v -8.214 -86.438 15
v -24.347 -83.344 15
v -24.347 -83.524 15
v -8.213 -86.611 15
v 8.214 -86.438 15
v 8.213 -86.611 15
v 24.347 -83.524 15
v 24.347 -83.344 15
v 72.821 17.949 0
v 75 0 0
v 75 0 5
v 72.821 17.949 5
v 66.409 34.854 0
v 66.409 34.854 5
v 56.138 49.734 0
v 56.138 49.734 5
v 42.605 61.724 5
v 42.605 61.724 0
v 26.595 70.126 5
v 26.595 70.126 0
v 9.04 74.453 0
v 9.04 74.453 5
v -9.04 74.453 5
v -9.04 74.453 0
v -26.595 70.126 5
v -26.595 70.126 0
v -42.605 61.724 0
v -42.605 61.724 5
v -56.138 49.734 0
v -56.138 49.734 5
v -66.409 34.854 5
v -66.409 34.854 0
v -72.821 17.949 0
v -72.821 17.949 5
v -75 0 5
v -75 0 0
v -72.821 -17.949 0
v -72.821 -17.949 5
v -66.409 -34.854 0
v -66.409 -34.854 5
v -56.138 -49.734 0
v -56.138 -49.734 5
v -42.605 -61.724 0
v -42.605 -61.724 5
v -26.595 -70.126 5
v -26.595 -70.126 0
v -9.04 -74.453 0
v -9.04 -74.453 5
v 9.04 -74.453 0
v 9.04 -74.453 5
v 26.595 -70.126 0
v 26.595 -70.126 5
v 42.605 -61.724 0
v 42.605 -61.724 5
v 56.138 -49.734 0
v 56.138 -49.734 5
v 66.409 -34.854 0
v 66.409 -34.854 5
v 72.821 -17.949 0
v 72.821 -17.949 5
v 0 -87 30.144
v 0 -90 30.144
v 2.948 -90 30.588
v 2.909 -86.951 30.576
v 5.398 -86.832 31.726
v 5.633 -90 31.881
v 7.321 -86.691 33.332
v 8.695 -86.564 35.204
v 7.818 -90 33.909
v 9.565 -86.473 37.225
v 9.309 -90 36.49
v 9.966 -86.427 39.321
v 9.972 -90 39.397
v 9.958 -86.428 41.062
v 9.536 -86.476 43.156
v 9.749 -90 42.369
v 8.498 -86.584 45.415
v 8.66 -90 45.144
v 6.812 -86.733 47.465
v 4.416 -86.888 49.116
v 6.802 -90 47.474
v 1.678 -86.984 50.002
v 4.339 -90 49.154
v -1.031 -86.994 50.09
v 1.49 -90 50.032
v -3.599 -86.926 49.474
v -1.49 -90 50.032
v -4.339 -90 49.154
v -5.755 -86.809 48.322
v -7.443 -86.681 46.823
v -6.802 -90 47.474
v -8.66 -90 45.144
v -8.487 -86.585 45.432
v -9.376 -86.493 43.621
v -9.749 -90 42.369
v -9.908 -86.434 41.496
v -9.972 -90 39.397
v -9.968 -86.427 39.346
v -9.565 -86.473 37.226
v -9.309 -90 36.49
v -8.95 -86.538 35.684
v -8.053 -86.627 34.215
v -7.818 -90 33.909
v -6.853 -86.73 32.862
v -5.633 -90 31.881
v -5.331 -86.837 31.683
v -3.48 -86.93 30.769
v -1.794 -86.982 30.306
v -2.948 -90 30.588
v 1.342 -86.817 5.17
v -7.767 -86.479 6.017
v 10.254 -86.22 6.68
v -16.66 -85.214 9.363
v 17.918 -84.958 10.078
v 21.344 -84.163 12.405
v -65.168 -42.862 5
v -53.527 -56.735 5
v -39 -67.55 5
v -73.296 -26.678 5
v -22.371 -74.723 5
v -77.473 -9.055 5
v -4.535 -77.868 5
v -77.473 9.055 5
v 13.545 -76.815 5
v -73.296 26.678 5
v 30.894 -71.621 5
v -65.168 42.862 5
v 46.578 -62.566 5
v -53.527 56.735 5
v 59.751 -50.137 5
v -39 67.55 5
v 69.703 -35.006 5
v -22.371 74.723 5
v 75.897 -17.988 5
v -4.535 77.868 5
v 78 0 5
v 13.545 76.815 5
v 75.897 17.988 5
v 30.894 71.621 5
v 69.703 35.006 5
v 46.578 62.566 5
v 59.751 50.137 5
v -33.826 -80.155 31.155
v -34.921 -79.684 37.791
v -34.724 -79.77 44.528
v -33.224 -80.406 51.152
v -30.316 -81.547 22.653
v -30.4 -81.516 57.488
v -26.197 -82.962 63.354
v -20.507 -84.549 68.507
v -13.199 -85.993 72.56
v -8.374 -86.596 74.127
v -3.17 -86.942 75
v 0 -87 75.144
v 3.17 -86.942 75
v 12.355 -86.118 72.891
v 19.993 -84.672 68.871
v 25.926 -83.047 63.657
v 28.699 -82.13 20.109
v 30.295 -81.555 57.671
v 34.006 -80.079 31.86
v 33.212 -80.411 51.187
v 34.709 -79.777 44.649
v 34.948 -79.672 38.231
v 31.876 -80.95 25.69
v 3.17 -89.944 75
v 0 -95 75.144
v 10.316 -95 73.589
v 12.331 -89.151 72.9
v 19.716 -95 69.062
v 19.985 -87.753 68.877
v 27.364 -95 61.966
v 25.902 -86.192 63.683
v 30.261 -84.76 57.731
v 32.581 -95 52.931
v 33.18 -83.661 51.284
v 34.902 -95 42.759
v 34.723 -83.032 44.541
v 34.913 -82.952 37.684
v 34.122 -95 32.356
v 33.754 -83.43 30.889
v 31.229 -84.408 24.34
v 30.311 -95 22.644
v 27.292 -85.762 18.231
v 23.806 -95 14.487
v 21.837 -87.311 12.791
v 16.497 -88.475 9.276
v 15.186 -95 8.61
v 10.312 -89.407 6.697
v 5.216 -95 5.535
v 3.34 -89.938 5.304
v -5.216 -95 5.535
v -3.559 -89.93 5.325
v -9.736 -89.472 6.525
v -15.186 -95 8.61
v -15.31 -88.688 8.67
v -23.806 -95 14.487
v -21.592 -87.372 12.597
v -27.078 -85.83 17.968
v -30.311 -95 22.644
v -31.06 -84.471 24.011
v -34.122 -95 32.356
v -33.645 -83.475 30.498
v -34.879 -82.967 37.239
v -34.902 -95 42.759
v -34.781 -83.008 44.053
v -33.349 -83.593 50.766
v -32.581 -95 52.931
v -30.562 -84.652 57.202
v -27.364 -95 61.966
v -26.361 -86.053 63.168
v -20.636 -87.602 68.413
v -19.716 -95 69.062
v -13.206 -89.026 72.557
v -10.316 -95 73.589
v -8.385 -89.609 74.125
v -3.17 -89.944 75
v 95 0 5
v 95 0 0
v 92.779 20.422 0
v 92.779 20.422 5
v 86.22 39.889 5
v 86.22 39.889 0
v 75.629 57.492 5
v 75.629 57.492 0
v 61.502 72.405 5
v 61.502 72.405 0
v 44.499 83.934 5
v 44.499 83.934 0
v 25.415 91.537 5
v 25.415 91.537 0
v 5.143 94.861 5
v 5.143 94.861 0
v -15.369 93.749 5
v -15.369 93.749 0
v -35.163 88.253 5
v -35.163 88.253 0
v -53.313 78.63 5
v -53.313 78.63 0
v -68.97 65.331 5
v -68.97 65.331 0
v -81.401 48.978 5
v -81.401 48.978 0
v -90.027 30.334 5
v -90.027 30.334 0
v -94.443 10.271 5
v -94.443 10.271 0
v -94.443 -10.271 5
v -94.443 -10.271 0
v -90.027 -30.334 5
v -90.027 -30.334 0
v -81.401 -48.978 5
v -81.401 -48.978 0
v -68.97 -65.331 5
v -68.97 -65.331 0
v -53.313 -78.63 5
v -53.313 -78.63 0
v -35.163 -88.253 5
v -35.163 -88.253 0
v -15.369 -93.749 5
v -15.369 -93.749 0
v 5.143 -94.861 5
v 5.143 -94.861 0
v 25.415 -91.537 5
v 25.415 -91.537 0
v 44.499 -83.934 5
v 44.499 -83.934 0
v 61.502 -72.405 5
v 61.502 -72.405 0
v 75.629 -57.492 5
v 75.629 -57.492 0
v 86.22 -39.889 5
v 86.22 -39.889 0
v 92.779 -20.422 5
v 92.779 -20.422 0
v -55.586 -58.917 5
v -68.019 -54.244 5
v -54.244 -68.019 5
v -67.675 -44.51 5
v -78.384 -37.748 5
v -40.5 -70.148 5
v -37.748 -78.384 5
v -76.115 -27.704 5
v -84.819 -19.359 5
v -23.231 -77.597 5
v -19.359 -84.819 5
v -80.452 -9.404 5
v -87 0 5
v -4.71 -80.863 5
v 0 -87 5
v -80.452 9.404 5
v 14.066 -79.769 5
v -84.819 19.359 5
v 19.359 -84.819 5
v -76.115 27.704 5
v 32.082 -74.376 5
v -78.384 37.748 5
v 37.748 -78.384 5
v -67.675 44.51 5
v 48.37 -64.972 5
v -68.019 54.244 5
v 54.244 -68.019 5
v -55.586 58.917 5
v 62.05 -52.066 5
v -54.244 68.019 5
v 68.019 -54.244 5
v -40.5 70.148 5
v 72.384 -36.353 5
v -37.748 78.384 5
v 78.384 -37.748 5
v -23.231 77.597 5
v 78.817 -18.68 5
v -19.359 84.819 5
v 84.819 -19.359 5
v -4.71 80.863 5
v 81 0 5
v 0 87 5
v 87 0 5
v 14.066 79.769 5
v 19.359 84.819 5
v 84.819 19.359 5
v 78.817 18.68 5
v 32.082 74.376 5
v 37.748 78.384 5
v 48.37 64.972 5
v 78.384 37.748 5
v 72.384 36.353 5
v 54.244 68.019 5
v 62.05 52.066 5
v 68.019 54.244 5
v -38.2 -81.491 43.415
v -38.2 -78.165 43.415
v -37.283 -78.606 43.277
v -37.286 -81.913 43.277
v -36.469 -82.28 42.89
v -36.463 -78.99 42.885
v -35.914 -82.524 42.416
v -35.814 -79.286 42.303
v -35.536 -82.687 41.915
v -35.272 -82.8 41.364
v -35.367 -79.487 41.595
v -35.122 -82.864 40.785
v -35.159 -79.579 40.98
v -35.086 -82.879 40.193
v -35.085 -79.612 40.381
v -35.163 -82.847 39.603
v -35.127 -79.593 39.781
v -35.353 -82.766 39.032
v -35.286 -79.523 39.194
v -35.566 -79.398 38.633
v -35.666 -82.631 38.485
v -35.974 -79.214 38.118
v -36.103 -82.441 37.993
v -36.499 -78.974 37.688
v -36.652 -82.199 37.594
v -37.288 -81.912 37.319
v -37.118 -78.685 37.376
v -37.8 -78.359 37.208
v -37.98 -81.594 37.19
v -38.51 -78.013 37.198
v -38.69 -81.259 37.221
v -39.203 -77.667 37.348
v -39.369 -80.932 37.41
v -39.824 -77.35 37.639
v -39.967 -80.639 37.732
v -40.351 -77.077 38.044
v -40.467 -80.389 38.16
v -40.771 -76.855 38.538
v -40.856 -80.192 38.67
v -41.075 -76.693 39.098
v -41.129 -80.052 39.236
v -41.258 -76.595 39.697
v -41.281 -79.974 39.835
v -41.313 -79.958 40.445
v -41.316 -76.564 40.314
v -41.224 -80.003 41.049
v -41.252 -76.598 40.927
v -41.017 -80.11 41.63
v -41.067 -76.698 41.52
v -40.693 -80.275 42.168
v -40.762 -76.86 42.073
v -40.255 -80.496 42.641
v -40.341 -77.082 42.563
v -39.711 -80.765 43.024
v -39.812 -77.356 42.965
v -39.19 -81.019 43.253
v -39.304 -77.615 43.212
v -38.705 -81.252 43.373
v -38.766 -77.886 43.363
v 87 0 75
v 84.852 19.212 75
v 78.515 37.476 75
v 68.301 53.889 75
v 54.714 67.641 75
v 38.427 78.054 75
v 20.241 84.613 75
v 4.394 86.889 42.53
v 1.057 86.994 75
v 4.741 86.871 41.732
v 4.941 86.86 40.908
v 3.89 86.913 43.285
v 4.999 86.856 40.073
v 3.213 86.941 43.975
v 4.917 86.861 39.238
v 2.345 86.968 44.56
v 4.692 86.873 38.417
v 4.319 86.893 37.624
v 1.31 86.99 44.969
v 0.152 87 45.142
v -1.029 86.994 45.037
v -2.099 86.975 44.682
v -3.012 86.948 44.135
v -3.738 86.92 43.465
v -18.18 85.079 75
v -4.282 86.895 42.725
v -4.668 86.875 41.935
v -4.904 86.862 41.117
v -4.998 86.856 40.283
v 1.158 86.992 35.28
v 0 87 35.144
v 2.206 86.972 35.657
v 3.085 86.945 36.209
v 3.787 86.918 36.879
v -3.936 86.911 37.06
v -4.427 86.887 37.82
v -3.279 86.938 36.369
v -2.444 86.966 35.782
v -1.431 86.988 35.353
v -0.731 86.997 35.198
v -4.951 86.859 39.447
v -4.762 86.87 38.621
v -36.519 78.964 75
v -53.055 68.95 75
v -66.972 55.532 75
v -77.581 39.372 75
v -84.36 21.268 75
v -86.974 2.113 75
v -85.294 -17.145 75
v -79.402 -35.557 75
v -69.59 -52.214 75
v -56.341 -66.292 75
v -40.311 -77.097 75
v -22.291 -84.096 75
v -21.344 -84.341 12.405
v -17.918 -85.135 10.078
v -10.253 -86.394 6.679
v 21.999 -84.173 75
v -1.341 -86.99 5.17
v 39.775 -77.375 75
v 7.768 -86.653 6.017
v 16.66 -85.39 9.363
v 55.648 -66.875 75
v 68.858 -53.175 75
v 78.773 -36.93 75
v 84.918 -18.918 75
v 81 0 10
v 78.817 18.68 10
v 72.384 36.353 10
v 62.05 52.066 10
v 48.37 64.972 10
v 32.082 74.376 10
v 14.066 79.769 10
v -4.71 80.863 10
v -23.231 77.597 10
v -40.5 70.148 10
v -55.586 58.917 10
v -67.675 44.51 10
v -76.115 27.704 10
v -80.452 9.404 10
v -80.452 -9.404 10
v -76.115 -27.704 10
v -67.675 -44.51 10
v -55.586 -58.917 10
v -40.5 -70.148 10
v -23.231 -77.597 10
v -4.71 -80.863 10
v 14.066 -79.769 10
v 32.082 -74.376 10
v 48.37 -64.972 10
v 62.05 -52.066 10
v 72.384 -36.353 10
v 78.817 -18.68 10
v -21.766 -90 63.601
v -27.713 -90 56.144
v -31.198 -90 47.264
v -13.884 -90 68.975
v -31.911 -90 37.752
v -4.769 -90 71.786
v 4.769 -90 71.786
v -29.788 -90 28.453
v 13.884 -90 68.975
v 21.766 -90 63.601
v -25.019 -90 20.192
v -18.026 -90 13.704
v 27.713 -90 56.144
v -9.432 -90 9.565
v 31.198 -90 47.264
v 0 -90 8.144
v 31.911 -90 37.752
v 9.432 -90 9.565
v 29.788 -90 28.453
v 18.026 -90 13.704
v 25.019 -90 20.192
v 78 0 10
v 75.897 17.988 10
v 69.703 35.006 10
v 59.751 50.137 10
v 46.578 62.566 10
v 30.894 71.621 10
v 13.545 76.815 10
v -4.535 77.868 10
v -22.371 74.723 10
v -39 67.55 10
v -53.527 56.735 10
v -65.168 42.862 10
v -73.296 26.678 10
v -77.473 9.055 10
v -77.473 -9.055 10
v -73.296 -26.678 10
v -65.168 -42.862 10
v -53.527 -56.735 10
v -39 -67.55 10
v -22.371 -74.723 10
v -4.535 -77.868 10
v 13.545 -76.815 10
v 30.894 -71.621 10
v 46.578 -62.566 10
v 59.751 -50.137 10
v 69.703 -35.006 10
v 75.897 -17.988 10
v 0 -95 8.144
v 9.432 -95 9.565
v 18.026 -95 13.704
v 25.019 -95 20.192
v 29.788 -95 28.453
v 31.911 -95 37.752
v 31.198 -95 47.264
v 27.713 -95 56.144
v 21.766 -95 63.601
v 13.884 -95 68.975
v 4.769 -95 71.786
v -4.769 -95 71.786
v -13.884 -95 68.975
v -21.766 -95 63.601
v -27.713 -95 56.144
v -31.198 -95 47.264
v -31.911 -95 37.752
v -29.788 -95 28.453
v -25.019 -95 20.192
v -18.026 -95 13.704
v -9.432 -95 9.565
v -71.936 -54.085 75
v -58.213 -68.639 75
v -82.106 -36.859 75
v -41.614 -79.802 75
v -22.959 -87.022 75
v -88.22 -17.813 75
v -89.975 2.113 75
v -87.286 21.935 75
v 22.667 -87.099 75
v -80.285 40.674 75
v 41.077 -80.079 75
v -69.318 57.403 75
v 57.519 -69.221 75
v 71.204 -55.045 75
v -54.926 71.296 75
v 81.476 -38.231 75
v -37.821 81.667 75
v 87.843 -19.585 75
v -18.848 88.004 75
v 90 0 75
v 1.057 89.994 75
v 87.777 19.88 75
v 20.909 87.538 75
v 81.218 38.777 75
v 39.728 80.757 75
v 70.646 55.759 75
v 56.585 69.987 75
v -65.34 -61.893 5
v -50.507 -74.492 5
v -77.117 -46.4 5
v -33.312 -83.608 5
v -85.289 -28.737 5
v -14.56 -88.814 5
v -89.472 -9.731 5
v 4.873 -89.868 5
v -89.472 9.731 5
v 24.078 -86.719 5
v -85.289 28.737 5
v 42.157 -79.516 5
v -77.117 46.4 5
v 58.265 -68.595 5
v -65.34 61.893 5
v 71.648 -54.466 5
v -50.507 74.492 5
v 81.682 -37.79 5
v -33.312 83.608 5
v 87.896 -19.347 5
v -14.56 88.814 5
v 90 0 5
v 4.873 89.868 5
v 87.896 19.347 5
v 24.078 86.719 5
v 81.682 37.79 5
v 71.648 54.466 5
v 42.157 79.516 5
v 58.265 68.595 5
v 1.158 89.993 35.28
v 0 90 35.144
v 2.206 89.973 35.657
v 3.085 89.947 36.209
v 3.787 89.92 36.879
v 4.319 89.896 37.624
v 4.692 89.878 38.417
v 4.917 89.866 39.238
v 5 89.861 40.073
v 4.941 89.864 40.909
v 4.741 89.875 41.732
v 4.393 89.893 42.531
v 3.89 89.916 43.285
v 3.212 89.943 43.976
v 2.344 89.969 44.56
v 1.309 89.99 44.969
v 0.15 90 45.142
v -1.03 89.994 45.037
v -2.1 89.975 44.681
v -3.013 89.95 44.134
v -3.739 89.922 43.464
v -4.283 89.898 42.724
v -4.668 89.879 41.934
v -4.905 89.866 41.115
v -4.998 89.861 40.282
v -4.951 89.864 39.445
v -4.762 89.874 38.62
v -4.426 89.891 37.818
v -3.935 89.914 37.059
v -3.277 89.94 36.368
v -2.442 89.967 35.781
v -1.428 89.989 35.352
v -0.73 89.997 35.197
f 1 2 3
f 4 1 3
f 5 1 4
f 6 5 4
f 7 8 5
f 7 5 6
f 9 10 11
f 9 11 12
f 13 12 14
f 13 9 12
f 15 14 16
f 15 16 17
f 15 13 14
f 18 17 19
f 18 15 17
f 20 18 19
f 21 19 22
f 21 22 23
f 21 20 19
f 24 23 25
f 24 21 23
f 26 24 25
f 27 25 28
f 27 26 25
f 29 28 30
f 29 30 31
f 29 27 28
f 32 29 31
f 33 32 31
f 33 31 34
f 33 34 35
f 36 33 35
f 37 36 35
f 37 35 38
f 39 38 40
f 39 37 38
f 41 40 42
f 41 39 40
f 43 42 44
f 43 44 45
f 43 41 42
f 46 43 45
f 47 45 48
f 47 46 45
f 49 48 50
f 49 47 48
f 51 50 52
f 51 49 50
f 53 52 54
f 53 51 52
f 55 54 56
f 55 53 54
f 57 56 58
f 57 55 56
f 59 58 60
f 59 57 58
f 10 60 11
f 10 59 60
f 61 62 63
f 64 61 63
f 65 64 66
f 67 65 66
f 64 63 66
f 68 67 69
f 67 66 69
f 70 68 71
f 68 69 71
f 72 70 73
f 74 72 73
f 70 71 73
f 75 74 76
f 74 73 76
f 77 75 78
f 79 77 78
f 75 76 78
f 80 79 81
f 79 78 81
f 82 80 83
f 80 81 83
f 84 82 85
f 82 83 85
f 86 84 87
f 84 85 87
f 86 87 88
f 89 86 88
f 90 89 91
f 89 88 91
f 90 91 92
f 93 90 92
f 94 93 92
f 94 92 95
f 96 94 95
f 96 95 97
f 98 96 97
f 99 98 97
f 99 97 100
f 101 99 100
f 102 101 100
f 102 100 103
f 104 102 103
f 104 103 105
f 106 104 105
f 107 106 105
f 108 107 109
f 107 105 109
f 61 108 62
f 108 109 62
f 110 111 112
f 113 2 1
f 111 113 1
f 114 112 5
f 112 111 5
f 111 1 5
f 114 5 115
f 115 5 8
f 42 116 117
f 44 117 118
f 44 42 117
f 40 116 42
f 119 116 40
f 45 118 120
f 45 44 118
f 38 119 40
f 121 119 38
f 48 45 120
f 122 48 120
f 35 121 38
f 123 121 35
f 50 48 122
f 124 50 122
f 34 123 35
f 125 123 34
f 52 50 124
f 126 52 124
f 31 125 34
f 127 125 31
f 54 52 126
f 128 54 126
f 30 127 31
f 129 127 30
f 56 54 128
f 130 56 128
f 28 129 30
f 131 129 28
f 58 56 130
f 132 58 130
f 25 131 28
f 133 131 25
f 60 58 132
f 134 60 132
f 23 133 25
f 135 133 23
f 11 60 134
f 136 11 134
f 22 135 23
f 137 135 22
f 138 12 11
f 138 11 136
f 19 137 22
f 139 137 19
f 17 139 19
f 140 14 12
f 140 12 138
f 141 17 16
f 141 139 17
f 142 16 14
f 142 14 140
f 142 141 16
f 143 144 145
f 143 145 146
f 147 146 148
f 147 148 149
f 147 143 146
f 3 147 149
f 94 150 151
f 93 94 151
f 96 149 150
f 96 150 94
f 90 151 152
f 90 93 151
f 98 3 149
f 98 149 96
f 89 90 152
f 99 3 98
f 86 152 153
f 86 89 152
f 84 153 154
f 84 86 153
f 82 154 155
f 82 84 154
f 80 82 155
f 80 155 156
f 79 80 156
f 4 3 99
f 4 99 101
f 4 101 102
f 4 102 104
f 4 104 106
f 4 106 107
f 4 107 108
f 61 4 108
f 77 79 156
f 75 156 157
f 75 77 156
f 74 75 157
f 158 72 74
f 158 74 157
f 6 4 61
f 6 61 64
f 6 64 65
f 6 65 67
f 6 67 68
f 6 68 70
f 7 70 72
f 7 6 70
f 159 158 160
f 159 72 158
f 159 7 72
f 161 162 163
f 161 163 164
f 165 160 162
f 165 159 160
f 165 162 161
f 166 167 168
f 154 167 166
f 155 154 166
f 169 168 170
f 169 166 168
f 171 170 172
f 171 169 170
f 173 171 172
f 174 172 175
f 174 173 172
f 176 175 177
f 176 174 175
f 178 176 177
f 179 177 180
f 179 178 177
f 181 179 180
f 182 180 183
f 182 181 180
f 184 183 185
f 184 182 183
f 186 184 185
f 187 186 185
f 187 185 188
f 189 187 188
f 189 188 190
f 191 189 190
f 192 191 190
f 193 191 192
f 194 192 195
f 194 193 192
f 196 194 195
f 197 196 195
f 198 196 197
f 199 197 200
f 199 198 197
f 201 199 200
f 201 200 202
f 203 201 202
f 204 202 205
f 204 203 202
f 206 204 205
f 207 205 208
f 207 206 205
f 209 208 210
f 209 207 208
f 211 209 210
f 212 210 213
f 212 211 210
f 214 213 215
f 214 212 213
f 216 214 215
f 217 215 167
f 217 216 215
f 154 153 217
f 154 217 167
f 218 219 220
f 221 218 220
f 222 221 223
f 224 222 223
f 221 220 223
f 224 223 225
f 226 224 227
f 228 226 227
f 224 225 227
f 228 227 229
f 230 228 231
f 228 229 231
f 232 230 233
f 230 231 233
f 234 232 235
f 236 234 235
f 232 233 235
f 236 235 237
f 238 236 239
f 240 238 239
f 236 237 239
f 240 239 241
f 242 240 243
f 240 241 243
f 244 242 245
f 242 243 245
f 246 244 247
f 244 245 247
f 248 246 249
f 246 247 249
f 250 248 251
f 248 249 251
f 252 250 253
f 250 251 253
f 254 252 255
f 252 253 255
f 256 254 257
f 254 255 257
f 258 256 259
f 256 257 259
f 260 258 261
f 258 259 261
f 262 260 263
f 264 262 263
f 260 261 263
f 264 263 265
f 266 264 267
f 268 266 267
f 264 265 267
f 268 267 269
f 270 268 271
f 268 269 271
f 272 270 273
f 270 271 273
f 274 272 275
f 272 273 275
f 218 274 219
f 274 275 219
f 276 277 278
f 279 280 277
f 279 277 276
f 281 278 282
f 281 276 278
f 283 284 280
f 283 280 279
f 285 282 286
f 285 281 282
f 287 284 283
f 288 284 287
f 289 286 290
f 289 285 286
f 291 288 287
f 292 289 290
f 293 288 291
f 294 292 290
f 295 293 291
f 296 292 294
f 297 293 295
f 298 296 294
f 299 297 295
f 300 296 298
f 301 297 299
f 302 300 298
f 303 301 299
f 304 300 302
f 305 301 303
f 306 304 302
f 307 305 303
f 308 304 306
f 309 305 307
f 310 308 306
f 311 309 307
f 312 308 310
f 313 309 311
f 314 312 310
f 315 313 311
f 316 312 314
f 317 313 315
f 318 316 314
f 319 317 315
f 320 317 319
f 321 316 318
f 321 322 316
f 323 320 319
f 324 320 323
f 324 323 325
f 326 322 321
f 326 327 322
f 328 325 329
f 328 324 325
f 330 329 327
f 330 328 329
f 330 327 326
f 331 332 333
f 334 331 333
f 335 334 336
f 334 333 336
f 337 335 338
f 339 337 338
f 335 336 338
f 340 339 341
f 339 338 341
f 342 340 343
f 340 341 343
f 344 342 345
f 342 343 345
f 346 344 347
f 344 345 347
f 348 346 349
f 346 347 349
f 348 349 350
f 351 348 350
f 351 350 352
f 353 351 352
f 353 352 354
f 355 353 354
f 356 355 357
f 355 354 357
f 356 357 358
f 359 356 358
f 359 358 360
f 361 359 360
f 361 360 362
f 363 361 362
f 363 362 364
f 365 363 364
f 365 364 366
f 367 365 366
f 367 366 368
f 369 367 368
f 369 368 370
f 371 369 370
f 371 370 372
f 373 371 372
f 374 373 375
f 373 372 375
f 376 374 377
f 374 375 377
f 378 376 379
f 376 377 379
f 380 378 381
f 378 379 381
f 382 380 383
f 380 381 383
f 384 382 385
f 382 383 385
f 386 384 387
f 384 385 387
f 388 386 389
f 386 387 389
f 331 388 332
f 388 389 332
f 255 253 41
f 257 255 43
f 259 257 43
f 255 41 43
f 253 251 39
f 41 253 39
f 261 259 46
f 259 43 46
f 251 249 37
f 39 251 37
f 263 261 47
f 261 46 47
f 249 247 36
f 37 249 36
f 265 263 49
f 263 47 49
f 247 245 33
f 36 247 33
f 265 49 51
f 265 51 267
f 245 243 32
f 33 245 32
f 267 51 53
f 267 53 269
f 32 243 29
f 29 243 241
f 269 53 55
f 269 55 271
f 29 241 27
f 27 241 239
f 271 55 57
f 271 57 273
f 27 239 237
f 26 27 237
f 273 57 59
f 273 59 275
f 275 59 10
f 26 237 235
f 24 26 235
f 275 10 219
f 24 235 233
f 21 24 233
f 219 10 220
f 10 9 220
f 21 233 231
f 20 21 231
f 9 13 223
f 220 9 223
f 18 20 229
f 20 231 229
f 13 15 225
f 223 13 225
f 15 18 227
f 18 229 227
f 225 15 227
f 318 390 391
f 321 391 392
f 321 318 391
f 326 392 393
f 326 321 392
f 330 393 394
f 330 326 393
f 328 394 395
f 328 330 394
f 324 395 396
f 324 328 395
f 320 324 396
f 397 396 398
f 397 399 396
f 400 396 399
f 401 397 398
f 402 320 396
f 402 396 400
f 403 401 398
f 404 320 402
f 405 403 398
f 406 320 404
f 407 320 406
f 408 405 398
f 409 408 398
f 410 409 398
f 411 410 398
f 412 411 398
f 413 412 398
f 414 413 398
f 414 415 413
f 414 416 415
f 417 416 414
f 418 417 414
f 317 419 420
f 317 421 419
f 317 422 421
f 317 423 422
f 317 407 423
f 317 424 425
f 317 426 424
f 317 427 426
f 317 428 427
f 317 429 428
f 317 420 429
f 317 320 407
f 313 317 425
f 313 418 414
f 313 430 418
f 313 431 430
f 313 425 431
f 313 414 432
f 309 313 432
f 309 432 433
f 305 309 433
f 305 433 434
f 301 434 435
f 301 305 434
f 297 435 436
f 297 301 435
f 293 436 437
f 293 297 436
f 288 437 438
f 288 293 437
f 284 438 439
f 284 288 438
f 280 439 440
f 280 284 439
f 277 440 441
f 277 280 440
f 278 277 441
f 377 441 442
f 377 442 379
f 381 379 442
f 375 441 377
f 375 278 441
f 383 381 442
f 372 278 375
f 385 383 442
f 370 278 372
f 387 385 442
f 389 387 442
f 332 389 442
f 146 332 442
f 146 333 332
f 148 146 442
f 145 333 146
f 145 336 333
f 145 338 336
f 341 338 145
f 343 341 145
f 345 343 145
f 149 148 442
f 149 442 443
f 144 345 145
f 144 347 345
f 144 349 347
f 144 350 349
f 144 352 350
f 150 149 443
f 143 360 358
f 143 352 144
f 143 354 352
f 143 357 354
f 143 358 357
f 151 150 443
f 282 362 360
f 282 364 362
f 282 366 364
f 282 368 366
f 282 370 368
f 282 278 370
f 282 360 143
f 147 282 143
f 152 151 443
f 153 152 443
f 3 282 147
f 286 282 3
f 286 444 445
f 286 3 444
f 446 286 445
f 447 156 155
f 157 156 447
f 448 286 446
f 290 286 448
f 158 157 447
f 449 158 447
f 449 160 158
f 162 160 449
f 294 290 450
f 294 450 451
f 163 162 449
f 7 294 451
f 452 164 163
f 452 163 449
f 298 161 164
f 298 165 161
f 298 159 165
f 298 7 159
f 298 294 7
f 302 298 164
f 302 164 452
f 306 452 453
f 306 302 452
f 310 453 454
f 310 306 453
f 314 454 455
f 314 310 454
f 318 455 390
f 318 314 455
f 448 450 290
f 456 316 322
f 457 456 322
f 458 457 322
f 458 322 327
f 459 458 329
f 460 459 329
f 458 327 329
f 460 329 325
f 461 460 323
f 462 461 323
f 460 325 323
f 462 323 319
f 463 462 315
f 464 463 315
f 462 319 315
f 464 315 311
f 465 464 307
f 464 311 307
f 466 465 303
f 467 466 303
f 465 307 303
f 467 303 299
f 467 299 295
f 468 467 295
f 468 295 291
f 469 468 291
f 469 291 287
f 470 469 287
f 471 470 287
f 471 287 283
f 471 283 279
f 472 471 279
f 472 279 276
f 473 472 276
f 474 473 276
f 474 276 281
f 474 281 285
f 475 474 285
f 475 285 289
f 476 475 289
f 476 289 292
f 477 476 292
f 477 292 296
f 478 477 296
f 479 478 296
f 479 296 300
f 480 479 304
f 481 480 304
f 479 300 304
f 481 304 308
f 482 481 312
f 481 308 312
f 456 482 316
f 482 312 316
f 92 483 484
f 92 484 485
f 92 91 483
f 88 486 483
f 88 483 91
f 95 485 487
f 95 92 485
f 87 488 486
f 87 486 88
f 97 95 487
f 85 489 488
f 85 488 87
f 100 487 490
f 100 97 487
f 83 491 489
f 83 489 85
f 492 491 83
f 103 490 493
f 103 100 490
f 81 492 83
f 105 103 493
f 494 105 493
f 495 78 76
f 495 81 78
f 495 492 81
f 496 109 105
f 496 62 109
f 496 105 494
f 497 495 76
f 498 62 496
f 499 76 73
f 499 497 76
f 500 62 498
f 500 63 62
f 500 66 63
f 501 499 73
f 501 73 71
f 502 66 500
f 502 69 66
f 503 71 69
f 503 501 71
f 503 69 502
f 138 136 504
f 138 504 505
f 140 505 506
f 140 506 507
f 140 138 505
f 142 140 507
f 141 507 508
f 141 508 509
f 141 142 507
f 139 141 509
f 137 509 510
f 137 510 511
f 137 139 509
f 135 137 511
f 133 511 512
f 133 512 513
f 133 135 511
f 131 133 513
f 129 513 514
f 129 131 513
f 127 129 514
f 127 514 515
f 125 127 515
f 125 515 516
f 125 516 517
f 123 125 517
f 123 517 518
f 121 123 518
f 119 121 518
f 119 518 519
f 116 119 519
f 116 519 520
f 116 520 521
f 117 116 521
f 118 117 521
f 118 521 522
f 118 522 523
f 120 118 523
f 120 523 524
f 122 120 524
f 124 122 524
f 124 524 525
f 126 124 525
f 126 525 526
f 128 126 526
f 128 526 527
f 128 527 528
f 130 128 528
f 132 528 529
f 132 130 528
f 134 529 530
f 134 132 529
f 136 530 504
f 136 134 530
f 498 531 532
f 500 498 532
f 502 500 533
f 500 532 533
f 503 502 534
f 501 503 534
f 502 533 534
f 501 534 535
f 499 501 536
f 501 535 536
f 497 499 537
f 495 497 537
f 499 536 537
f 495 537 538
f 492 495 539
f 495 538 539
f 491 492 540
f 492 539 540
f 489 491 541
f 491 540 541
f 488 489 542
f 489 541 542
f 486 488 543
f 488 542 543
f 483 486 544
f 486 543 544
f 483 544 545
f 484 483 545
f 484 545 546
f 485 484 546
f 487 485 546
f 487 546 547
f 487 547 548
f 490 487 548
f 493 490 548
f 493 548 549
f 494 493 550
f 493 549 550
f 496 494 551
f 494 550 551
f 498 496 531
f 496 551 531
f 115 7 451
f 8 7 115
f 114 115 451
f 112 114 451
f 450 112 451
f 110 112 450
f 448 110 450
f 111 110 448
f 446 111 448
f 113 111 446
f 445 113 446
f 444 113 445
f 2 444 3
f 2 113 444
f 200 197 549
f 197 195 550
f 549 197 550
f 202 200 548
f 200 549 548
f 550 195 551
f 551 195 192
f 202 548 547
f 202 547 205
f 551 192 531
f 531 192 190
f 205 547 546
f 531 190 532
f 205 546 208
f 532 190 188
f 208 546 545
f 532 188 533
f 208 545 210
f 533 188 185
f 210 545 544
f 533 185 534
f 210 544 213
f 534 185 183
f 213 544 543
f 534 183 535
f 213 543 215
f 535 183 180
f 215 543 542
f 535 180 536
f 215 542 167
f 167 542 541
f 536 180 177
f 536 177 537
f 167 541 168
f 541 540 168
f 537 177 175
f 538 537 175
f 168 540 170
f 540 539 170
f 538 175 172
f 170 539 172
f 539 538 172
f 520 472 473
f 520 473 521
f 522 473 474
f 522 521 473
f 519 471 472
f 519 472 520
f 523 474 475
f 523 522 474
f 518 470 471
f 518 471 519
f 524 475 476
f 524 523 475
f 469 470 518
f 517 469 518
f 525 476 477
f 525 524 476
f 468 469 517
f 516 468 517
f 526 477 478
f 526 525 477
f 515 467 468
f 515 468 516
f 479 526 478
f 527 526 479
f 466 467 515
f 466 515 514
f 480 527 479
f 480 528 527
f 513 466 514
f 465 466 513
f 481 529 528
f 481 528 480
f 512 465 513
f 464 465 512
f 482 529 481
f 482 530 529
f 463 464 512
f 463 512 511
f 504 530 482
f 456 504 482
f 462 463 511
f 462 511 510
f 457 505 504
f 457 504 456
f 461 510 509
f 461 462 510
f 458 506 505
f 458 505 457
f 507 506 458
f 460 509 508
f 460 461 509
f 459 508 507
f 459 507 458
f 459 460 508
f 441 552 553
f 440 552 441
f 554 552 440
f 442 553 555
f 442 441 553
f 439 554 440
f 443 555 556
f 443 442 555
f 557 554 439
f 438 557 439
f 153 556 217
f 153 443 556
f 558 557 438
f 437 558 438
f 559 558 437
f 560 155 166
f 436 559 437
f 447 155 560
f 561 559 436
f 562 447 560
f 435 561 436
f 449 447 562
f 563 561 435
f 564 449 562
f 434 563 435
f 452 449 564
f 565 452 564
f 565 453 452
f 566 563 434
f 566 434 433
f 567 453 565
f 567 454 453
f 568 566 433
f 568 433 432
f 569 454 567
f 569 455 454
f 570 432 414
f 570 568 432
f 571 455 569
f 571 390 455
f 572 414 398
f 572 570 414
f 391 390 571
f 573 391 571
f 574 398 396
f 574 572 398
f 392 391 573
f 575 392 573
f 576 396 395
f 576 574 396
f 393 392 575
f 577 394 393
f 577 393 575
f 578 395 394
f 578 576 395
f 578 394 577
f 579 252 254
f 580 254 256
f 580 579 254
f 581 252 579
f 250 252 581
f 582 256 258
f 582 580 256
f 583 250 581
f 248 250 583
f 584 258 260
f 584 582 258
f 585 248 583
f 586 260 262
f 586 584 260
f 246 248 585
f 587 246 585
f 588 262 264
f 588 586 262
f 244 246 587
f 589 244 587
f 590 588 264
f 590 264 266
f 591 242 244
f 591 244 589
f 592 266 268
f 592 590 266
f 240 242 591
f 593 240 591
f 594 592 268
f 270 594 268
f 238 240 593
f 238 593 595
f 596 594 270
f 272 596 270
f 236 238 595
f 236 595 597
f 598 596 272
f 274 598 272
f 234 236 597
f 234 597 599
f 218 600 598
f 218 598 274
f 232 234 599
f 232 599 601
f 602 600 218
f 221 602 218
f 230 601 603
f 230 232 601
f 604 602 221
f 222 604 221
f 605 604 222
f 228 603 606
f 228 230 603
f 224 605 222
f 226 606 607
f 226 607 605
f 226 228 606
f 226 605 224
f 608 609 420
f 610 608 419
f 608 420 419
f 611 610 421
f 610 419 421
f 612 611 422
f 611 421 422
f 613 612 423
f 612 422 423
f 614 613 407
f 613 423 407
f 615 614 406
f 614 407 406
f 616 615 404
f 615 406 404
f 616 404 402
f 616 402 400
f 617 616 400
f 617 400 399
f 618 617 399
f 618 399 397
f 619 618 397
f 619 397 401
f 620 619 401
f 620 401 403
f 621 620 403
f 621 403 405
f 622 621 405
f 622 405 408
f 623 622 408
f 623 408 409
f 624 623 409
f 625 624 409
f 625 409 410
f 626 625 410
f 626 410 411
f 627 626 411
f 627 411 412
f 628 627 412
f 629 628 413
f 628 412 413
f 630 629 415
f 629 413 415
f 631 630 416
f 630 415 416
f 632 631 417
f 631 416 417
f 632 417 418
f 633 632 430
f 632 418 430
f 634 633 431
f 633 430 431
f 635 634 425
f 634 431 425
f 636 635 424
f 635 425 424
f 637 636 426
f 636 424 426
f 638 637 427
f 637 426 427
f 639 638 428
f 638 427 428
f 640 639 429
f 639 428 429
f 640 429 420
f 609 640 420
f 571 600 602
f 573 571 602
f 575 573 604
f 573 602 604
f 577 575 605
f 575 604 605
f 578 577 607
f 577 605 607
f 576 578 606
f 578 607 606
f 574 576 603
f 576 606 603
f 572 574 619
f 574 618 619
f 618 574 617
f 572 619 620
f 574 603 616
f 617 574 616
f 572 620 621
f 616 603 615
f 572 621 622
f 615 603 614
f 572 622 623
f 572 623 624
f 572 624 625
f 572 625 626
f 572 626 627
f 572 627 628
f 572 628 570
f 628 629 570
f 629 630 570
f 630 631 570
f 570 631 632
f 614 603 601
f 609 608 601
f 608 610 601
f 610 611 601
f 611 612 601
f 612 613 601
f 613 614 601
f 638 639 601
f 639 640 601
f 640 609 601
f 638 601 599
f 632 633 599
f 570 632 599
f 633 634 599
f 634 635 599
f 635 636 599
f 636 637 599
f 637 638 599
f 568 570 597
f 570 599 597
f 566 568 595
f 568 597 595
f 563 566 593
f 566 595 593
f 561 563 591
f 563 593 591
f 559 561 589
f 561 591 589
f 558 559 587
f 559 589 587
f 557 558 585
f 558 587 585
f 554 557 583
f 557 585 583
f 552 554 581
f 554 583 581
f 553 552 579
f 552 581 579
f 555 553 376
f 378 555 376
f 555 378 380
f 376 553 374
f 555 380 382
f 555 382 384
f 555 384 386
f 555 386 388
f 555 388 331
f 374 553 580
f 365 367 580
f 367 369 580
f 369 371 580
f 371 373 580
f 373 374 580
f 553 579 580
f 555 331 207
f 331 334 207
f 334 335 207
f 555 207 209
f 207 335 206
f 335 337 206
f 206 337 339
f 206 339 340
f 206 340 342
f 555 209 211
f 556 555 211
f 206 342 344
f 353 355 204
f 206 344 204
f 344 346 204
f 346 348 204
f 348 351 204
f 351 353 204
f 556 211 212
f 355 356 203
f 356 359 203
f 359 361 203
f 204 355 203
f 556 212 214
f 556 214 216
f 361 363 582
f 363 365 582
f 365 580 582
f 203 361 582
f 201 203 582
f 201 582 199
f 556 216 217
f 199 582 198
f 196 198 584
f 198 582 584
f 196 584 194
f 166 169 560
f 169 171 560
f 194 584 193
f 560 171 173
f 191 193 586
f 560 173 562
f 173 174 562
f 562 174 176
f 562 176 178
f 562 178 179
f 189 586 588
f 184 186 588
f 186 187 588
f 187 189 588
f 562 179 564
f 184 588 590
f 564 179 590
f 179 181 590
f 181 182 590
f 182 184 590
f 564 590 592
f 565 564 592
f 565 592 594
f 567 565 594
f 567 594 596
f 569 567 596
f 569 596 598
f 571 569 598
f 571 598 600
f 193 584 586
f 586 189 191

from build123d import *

# Parameters (mm, degrees)
SKETCH2_R           = 95
SKETCH2_R_2         = 75
BOSS_EXTRUDE1_DEPTH = 5
SKETCH3_R           = 90
SKETCH3_R_2         = 87
BOSS_EXTRUDE2_DEPTH = 75
SKETCH4_R           = 81
SKETCH4_R_2         = 78
BOSS_EXTRUDE4_DEPTH = 10
SKETCH6_R           = 35
BOSS_EXTRUDE5_DEPTH = 95
SKETCH7_R           = 75
CUT_EXTRUDE1_DEPTH  = 95
SKETCH8_R           = 87
CUT_EXTRUDE3_DEPTH  = 95
SKETCH9_R           = 86.82735855
CUT_EXTRUDE4_DEPTH  = 10
SKETCH10_R          = 81
SKETCH10_R_2        = 78
BOSS_EXTRUDE6_DEPTH = 10
SKETCH11_R          = 32
CUT_EXTRUDE5_DEPTH  = 5
SKETCH12_R          = 10
CUT_EXTRUDE6_DEPTH  = 5
SKETCH13_R          = 5
CUT_EXTRUDE7_DEPTH  = 185
SKETCH14_R          = 3.11609281
CUT_EXTRUDE9_DEPTH  = 185


with BuildPart() as part:
    # Sketch2 → Boss-Extrude1 (new body)
    with BuildSketch(Plane.XY):
        Circle(SKETCH2_R)
        Circle(SKETCH2_R_2, mode=Mode.SUBTRACT)
    extrude(amount=BOSS_EXTRUDE1_DEPTH)

    # Sketch3 → Boss-Extrude2 (add)
    with BuildSketch(Plane.XY):
        Circle(SKETCH3_R)
        Circle(SKETCH3_R_2, mode=Mode.SUBTRACT)
    extrude(amount=BOSS_EXTRUDE2_DEPTH)

    # Sketch4 → Boss-Extrude4 (add)
    with BuildSketch(Plane.XY):
        Circle(SKETCH4_R)
        Circle(SKETCH4_R_2, mode=Mode.SUBTRACT)
    extrude(amount=BOSS_EXTRUDE4_DEPTH)

    # Sketch6 → Boss-Extrude5 (add)
    with BuildSketch(Plane(origin=(0, 0, 0), x_dir=(1, 0, 0), z_dir=(0, 1, 0))):
        with Locations(Location((0, -40.143816704, 0), (0, 0, 270))):
            Circle(SKETCH6_R)
    extrude(amount=-BOSS_EXTRUDE5_DEPTH)

    # Sketch7 → Cut-Extrude1 (cut)
    with BuildSketch(Plane.XY):
        Circle(SKETCH7_R)
    extrude(amount=CUT_EXTRUDE1_DEPTH, mode=Mode.SUBTRACT)

    # Sketch8 → Cut-Extrude3 (cut)
    with BuildSketch(Plane.XY.offset(15)):
        with Locations(Location((0, 0, 0), (0, 0, 267.912115018))):
            Circle(SKETCH8_R)
    extrude(amount=CUT_EXTRUDE3_DEPTH, mode=Mode.SUBTRACT)

    # Sketch9 → Cut-Extrude4 (cut)
    with BuildSketch(Plane.XY.offset(15)):
        Circle(SKETCH9_R)
    extrude(amount=-CUT_EXTRUDE4_DEPTH, mode=Mode.SUBTRACT)

    # Sketch10 → Boss-Extrude6 (add)
    with BuildSketch(Plane.XY):
        Circle(SKETCH10_R)
        Circle(SKETCH10_R_2, mode=Mode.SUBTRACT)
    extrude(amount=BOSS_EXTRUDE6_DEPTH)

    # Sketch11 → Cut-Extrude5 (cut)
    with BuildSketch(Plane.XZ.offset(95)):
        with Locations(Location((0, 40.143816704, 0), (0, 0, 270))):
            Circle(SKETCH11_R)
    extrude(amount=-CUT_EXTRUDE5_DEPTH, mode=Mode.SUBTRACT)

    # Sketch12 → Cut-Extrude6 (cut)
    with BuildSketch(Plane.XZ.offset(90)):
        with Locations(Location((0, 40.143816704, 0), (0, 0, 270))):
            Circle(SKETCH12_R)
    extrude(amount=-CUT_EXTRUDE6_DEPTH, mode=Mode.SUBTRACT)

    # Sketch13 → Cut-Extrude7 (cut)
    with BuildSketch(Plane.XZ.offset(90)):
        with Locations(Location((0, 40.143816704, 0), (0, 0, 270))):
            Circle(SKETCH13_R)
    extrude(amount=-CUT_EXTRUDE7_DEPTH, mode=Mode.SUBTRACT)

    # Sketch14 → Cut-Extrude9 (cut)
    with BuildSketch(Plane(origin=(0, 0, 0), x_dir=(1, 0, 0), z_dir=(0, 1, 0))):
        with Locations(Location((-38.2, -40.29848956, 0), (0, 0, 270))):
            Circle(SKETCH14_R)
    extrude(amount=-CUT_EXTRUDE9_DEPTH, mode=Mode.SUBTRACT)


solid = part.part
